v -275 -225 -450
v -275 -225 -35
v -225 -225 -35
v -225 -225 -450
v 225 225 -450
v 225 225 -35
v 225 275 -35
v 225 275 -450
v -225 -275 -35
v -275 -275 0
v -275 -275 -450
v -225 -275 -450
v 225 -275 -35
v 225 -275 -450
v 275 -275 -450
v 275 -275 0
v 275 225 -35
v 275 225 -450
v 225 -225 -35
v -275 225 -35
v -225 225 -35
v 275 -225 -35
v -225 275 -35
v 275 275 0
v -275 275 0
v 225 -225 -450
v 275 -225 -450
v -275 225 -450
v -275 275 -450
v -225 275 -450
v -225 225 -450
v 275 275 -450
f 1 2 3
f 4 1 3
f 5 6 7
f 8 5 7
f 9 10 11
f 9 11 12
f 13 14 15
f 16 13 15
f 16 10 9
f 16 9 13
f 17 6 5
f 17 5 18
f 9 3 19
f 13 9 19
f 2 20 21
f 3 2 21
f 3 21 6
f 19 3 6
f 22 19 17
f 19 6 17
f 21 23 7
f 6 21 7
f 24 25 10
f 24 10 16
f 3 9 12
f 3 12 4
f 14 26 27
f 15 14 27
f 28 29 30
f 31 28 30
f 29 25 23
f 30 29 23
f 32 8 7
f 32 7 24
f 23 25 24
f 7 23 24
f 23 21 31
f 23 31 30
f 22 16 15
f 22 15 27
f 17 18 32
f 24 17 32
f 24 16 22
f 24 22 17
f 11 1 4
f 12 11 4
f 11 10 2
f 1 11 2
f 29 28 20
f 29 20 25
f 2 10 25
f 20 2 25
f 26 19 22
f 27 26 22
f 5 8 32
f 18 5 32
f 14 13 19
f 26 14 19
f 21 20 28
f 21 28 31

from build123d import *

# Parameters (mm, degrees)
F0_W     = 550
F0_H     = 550
F1_DEPTH = 35
F2_W     = 50
F2_H     = 50
F3_DEPTH = 450


with BuildPart() as f1:
    # F0 (on Top) → F1 (new body)
    with BuildSketch(Plane.XY):
        Rectangle(F0_W, F0_H)
    extrude(amount=-F1_DEPTH)

    # F2 (on Top) → F3 (join)
    with BuildSketch(Plane.XY):
        with Locations((250, 250)):
            Rectangle(F2_W, F2_H)
        with Locations((250, -250)):
            Rectangle(F2_W, F2_H)
        with Locations((-250, 250)):
            Rectangle(F2_W, F2_H)
        with Locations((-250, -250)):
            Rectangle(F2_W, F2_H)
    extrude(amount=-F3_DEPTH)


solid = f1.part
